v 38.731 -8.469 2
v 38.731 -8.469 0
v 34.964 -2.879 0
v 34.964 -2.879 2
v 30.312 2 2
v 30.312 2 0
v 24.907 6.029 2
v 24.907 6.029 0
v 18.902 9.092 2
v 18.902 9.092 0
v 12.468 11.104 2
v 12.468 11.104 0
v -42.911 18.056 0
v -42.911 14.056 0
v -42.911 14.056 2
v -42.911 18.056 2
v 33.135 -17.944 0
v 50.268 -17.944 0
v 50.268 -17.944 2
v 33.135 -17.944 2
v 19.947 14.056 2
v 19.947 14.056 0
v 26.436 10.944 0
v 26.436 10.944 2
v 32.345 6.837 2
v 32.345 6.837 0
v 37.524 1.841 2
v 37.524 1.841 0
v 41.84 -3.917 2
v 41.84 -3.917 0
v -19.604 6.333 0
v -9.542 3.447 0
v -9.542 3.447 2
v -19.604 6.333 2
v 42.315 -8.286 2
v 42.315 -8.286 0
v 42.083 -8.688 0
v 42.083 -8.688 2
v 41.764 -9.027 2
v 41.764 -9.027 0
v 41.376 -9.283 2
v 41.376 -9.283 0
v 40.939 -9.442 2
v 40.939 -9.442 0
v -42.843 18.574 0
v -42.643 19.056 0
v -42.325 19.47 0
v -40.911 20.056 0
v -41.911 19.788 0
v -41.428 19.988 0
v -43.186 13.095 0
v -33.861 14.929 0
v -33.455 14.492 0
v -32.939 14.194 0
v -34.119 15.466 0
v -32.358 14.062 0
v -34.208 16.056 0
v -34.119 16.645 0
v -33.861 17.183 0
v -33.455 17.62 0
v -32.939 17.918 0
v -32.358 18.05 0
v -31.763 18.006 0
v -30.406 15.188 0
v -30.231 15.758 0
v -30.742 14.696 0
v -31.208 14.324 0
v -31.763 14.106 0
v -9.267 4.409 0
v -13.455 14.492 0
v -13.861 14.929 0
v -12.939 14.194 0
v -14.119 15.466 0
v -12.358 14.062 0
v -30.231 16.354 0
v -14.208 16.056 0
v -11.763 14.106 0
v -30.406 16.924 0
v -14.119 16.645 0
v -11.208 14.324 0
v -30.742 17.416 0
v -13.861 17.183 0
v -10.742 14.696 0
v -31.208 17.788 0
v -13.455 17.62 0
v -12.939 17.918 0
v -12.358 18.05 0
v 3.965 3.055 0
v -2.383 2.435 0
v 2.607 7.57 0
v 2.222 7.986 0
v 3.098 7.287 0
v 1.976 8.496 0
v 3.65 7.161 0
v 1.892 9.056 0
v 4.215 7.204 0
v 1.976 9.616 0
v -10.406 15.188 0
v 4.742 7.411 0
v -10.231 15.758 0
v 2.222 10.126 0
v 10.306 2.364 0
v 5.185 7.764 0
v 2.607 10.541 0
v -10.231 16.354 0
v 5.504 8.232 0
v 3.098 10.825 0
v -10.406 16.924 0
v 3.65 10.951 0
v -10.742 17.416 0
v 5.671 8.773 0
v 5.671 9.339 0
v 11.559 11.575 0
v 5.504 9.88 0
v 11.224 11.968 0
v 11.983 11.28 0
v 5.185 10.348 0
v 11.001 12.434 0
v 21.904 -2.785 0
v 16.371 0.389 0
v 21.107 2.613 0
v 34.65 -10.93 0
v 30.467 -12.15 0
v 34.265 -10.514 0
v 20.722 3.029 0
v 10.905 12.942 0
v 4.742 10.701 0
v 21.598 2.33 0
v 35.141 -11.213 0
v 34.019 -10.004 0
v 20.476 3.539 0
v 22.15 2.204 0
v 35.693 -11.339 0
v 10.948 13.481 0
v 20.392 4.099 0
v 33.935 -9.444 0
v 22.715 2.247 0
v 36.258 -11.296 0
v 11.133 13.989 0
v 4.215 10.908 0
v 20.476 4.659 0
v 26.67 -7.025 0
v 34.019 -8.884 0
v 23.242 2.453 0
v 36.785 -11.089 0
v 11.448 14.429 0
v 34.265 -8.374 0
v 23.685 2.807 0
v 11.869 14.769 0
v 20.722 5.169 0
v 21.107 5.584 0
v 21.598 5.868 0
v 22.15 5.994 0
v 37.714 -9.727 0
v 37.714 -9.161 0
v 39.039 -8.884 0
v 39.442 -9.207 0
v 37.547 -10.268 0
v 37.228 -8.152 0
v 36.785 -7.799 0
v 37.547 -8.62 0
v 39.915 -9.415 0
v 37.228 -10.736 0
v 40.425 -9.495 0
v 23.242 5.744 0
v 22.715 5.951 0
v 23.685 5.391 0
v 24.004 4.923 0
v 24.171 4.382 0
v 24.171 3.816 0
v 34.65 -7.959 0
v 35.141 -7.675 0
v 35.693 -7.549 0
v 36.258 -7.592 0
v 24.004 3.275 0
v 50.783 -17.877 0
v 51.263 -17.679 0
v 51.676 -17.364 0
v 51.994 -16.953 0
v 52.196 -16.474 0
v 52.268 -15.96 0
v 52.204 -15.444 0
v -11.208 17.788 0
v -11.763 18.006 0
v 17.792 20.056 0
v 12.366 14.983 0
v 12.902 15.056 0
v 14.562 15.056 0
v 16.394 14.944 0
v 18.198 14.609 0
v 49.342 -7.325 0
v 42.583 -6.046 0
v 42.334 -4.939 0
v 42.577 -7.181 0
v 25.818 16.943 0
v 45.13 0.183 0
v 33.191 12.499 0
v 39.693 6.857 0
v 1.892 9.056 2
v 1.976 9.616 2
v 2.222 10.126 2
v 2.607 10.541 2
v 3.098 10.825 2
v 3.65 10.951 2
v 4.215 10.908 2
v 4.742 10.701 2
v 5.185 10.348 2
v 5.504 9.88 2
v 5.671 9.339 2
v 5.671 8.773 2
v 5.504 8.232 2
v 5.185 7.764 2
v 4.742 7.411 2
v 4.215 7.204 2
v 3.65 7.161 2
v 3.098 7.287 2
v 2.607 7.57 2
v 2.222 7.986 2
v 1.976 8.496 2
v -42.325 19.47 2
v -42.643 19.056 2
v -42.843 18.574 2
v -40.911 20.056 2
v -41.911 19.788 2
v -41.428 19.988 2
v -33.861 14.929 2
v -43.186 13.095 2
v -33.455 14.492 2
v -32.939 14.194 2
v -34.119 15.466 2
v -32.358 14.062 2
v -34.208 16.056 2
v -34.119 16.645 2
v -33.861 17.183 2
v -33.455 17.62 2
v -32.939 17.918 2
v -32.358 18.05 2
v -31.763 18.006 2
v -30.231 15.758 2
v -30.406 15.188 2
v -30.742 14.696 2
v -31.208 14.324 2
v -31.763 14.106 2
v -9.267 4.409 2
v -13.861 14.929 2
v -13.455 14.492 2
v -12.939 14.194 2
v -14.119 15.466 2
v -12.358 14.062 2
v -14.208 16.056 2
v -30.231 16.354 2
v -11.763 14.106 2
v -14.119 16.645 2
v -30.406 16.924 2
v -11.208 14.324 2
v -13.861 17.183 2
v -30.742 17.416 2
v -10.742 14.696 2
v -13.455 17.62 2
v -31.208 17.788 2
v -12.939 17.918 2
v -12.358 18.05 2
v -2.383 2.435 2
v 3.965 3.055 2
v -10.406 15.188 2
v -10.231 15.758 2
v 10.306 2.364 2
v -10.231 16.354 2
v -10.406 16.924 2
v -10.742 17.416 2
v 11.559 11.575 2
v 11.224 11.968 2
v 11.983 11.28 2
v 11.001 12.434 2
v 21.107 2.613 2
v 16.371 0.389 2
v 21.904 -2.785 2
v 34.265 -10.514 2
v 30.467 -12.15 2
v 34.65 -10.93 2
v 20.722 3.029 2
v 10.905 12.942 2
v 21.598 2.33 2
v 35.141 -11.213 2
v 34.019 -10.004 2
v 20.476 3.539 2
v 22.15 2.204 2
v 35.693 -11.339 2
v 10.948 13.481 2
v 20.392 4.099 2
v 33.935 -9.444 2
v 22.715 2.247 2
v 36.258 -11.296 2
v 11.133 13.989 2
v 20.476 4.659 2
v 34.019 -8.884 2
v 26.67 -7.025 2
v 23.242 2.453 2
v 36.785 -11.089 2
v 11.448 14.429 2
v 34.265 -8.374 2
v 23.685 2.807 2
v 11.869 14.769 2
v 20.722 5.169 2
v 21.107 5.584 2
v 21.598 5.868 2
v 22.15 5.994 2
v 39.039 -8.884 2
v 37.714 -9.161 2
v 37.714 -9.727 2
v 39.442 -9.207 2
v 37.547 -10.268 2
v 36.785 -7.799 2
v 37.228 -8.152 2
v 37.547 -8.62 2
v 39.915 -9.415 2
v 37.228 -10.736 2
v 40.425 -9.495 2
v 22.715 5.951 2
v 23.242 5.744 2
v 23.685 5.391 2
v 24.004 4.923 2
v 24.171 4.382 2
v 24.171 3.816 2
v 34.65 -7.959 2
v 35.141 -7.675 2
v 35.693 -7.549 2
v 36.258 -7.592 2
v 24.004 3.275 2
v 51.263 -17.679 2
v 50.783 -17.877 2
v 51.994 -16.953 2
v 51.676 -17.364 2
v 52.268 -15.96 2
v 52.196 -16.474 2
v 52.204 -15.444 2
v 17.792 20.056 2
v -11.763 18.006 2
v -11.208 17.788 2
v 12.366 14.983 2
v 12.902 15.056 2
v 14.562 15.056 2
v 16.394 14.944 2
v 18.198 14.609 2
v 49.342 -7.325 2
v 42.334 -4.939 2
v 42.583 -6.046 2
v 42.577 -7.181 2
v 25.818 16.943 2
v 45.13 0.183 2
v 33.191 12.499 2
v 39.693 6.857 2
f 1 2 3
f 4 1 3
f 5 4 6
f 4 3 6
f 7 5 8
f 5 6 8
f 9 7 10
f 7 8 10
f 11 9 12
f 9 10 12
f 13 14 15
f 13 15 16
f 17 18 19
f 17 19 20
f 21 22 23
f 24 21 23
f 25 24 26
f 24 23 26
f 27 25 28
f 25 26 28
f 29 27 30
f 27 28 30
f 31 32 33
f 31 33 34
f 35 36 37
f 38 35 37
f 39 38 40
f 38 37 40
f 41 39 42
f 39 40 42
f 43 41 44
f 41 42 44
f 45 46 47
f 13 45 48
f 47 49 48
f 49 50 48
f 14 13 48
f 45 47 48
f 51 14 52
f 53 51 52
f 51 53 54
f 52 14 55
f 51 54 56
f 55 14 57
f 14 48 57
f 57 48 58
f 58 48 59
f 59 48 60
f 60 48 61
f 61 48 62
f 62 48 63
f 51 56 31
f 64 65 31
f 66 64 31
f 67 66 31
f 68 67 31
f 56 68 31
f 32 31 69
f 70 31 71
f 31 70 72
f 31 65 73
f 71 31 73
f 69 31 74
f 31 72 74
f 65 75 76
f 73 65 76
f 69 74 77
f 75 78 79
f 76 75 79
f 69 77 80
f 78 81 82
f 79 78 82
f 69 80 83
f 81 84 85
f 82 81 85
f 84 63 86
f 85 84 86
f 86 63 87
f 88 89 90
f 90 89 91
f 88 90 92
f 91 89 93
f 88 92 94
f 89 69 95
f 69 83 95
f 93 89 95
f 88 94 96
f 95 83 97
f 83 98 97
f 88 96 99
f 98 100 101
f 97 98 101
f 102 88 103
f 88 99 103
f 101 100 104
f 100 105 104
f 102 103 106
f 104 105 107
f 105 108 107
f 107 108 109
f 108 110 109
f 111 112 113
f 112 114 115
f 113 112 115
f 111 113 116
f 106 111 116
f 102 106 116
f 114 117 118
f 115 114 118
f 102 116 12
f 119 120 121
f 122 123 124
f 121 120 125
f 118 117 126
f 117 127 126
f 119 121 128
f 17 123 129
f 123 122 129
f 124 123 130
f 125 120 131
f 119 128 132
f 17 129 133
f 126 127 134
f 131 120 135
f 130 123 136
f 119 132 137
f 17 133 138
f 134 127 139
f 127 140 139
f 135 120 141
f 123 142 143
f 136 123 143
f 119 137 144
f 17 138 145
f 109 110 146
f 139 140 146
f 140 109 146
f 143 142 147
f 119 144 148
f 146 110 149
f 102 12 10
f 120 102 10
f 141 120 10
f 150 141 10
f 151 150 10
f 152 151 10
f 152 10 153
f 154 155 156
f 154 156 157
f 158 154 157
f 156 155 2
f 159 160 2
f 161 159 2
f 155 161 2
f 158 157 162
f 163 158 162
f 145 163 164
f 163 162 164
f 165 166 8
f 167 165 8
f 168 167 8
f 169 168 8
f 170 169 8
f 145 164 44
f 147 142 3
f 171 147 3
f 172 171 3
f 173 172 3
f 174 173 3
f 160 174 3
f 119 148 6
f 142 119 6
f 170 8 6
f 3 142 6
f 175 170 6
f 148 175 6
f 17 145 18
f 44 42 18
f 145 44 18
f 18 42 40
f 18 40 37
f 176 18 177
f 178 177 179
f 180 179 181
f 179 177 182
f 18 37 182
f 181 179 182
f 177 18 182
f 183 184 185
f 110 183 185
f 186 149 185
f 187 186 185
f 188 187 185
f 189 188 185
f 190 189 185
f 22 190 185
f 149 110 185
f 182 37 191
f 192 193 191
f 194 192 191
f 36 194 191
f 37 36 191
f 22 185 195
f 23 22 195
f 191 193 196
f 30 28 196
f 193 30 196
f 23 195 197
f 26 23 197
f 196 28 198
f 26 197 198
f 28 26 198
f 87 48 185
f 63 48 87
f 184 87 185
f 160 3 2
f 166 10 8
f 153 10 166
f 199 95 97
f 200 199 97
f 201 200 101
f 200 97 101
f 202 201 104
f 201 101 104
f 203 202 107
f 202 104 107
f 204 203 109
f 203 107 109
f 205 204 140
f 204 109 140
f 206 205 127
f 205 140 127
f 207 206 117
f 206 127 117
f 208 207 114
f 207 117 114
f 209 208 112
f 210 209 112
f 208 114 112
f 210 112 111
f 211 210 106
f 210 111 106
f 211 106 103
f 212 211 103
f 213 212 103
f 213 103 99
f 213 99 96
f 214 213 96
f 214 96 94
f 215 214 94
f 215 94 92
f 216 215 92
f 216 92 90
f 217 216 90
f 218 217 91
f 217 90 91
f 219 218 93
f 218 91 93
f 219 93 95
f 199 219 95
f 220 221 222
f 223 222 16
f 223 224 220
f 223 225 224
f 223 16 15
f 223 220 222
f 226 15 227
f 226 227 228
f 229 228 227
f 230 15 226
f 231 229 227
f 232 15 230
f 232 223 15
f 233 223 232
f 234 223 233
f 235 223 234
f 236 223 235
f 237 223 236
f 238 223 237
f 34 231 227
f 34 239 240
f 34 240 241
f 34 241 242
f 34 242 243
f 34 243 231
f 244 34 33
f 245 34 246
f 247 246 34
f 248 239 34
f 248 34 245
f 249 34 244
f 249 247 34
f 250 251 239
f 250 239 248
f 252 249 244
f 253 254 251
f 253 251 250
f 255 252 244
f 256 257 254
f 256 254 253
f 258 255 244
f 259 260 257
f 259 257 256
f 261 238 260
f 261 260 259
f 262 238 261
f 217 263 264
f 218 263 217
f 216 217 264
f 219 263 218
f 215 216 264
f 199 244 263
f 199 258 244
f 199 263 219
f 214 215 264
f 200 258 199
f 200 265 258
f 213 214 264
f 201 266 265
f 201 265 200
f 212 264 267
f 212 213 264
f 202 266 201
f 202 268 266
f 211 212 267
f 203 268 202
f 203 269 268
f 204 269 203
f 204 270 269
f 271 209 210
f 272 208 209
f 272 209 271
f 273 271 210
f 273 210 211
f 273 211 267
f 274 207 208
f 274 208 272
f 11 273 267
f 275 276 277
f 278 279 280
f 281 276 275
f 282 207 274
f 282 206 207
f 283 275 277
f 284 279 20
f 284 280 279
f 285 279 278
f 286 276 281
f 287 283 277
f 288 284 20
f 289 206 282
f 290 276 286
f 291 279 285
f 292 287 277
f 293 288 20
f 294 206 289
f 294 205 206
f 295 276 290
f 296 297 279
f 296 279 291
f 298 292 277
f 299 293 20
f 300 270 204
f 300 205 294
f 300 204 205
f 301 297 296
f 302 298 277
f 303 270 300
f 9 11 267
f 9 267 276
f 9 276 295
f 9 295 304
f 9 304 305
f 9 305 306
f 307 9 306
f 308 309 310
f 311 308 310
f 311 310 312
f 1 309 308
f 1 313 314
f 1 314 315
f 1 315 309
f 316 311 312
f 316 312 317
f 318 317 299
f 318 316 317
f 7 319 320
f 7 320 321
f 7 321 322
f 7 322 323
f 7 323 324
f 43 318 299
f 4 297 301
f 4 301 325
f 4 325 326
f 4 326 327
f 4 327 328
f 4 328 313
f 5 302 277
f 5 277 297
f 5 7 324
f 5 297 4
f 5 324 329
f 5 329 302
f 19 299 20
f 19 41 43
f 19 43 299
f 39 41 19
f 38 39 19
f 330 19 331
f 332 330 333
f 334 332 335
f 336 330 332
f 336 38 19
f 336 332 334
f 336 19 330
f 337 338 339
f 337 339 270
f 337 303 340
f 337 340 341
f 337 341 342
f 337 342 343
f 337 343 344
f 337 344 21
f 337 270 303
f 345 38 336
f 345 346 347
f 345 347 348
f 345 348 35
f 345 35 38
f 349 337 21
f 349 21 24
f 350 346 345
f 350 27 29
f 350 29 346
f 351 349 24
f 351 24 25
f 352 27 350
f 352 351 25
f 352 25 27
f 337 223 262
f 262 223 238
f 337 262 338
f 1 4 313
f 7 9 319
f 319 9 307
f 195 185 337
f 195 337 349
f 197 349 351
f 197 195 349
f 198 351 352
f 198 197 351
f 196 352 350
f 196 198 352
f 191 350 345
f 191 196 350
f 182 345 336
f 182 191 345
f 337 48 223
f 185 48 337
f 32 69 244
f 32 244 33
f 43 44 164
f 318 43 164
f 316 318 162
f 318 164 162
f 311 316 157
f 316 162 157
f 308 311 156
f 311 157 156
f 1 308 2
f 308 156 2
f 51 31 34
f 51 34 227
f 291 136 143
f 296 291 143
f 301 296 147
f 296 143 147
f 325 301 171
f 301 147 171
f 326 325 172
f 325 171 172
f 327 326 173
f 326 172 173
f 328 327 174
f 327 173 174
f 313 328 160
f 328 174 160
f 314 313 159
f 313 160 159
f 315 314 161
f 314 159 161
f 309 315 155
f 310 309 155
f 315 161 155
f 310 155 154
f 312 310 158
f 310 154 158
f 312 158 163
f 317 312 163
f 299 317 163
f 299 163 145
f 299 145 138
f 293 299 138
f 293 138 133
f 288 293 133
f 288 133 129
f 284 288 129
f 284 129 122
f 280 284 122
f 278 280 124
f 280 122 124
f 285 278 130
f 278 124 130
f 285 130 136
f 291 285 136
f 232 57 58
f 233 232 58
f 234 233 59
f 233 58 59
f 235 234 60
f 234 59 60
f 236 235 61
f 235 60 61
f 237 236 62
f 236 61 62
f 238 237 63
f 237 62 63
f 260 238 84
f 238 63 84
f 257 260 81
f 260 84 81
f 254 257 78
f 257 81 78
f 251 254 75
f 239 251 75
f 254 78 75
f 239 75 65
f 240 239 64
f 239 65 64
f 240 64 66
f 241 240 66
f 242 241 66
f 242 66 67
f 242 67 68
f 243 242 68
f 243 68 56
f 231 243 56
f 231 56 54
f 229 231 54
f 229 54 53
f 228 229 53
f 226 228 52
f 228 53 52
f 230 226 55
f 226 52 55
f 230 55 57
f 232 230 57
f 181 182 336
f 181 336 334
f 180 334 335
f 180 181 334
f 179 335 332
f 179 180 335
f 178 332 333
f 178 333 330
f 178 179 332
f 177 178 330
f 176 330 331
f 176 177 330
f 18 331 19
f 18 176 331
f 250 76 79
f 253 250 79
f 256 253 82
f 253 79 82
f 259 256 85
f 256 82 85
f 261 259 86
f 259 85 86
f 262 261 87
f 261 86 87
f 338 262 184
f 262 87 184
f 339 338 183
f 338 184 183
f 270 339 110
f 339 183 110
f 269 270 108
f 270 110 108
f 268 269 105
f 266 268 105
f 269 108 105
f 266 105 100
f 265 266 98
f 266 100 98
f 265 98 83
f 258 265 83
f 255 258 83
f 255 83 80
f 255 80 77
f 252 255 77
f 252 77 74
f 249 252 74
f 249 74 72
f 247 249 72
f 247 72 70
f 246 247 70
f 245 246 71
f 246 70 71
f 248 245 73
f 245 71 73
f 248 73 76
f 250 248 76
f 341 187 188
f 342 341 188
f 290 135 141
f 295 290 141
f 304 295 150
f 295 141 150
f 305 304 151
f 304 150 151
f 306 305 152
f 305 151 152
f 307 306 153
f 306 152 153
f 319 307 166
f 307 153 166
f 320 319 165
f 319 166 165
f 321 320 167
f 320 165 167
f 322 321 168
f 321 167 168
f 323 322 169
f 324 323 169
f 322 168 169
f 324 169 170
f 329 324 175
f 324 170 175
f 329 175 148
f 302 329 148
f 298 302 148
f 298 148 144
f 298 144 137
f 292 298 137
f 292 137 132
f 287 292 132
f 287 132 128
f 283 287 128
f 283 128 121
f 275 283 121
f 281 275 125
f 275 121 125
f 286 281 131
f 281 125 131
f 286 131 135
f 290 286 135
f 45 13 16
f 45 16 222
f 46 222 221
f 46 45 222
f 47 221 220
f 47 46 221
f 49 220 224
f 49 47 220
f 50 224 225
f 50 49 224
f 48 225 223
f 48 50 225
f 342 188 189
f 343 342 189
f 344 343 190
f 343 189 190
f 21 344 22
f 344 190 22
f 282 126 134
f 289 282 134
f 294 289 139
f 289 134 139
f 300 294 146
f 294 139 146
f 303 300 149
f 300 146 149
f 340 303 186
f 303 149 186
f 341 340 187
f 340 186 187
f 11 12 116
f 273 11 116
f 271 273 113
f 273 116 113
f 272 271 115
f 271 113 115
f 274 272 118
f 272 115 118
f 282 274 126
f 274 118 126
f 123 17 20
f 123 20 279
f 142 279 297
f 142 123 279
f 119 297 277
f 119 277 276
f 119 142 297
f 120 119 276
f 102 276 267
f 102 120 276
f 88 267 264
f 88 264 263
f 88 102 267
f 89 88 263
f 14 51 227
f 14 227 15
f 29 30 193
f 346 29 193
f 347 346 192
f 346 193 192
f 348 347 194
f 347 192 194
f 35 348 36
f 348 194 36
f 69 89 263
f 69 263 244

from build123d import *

# Parameters (mm, degrees)
SKETCH_1_W          = 128.43547374
SKETCH_1_H          = 65.471989544
EXTRUDE_1_DEPTH     = 2
SKETCH_2_W          = 128.43547374
SKETCH_2_H          = 65.471989544
CUT_EXTRUDE_1_DEPTH = 2
SKETCH_3_R          = 2
SKETCH_3_R_2        = 1.9
CUT_EXTRUDE_2_DEPTH = 2


with BuildPart() as part:
    # 草图1 → 凸台-拉伸1 (new body)
    with BuildSketch(Plane.XY):
        Rectangle(SKETCH_1_W, SKETCH_1_H)
    extrude(amount=EXTRUDE_1_DEPTH)

    # 草图2 → 切除-拉伸1 (cut)
    # profile 1 of 2: a face of its own
    with BuildSketch(Plane(origin=(0, 0, 0), x_dir=(-1, 0, 0), z_dir=(0, 0, -1))):
        Rectangle(SKETCH_2_W, SKETCH_2_H)
        with BuildLine():
            Line((9.542331638, 3.44740736), (9.266694282, 4.408669056))
            Line((9.266694282, 4.408669056), (2.382968092, 2.434792334))
            ThreePointArc((2.382968092, 2.434792334), (-19.219474678, -1.055618469), (-33.134584344, -17.944023491))
            Line((-33.134584344, -17.944023491), (-50.267582996, -17.944023491))
            ThreePointArc((-50.267582996, -17.944023491), (-51.848721826, -17.168768362), (-52.204074669, -15.444023491))
            ThreePointArc((-52.204074669, -15.444023491), (-39.692841918, 6.857039096), (-17.791782842, 20.055976509))
            Line((-17.791782842, 20.055976509), (40.91085364, 20.055976509))
            ThreePointArc((40.91085364, 20.055976509), (42.325067202, 19.470190071), (42.91085364, 18.055976509))
            Line((42.91085364, 18.055976509), (42.91085364, 14.055976509))
            Line((42.91085364, 14.055976509), (43.186490996, 13.094714813))
            Line((43.186490996, 13.094714813), (9.542331638, 3.44740736))
        make_face(mode=Mode.SUBTRACT)
    # profile 2 of 2: a face of its own
    with BuildSketch(Plane(origin=(0, 0, 0), x_dir=(-1, 0, 0), z_dir=(0, 0, -1))):
        with BuildLine():
            ThreePointArc((-12.46838625, 11.103595557), (-10.914156826, 13.274194399), (-12.902216421, 15.055976509))
            Line((-12.902216421, 15.055976509), (-14.562112456, 15.055976509))
            ThreePointArc((-14.562112456, 15.055976509), (-17.300725243, 14.803857713), (-19.947277263, 14.055976509))
            ThreePointArc((-19.947277263, 14.055976509), (-32.344819708, 6.837064556), (-41.840361935, -3.916838284))
            ThreePointArc((-41.840361935, -3.916838284), (-42.583463702, -6.046223655), (-42.315225959, -8.285538463))
            ThreePointArc((-42.315225959, -8.285538463), (-40.580263178, -9.493037777), (-38.730856221, -8.469395089))
            ThreePointArc((-38.730856221, -8.469395089), (-27.694864361, 4.128436562), (-12.46838625, 11.103595557))
        make_face()
    extrude(amount=-CUT_EXTRUDE_1_DEPTH, mode=Mode.SUBTRACT)

    # 草图3 → 切除-拉伸2 (cut)
    with BuildSketch(Plane(origin=(0, 0, 0), x_dir=(-1, 0, 0), z_dir=(0, 0, -1))):
        with Locations((32.208217158, 16.055976509)):
            Circle(SKETCH_3_R)
        with Locations((12.208217158, 16.055976509)):
            Circle(SKETCH_3_R)
        with Locations((-3.791782842, 9.055976509)):
            Circle(SKETCH_3_R_2)
        with Locations((-35.834722782, -9.444023491)):
            Circle(SKETCH_3_R_2)
        with Locations((-22.291782842, 4.098916449)):
            Circle(SKETCH_3_R_2)
    extrude(amount=-CUT_EXTRUDE_2_DEPTH, mode=Mode.SUBTRACT)


solid = part.part
